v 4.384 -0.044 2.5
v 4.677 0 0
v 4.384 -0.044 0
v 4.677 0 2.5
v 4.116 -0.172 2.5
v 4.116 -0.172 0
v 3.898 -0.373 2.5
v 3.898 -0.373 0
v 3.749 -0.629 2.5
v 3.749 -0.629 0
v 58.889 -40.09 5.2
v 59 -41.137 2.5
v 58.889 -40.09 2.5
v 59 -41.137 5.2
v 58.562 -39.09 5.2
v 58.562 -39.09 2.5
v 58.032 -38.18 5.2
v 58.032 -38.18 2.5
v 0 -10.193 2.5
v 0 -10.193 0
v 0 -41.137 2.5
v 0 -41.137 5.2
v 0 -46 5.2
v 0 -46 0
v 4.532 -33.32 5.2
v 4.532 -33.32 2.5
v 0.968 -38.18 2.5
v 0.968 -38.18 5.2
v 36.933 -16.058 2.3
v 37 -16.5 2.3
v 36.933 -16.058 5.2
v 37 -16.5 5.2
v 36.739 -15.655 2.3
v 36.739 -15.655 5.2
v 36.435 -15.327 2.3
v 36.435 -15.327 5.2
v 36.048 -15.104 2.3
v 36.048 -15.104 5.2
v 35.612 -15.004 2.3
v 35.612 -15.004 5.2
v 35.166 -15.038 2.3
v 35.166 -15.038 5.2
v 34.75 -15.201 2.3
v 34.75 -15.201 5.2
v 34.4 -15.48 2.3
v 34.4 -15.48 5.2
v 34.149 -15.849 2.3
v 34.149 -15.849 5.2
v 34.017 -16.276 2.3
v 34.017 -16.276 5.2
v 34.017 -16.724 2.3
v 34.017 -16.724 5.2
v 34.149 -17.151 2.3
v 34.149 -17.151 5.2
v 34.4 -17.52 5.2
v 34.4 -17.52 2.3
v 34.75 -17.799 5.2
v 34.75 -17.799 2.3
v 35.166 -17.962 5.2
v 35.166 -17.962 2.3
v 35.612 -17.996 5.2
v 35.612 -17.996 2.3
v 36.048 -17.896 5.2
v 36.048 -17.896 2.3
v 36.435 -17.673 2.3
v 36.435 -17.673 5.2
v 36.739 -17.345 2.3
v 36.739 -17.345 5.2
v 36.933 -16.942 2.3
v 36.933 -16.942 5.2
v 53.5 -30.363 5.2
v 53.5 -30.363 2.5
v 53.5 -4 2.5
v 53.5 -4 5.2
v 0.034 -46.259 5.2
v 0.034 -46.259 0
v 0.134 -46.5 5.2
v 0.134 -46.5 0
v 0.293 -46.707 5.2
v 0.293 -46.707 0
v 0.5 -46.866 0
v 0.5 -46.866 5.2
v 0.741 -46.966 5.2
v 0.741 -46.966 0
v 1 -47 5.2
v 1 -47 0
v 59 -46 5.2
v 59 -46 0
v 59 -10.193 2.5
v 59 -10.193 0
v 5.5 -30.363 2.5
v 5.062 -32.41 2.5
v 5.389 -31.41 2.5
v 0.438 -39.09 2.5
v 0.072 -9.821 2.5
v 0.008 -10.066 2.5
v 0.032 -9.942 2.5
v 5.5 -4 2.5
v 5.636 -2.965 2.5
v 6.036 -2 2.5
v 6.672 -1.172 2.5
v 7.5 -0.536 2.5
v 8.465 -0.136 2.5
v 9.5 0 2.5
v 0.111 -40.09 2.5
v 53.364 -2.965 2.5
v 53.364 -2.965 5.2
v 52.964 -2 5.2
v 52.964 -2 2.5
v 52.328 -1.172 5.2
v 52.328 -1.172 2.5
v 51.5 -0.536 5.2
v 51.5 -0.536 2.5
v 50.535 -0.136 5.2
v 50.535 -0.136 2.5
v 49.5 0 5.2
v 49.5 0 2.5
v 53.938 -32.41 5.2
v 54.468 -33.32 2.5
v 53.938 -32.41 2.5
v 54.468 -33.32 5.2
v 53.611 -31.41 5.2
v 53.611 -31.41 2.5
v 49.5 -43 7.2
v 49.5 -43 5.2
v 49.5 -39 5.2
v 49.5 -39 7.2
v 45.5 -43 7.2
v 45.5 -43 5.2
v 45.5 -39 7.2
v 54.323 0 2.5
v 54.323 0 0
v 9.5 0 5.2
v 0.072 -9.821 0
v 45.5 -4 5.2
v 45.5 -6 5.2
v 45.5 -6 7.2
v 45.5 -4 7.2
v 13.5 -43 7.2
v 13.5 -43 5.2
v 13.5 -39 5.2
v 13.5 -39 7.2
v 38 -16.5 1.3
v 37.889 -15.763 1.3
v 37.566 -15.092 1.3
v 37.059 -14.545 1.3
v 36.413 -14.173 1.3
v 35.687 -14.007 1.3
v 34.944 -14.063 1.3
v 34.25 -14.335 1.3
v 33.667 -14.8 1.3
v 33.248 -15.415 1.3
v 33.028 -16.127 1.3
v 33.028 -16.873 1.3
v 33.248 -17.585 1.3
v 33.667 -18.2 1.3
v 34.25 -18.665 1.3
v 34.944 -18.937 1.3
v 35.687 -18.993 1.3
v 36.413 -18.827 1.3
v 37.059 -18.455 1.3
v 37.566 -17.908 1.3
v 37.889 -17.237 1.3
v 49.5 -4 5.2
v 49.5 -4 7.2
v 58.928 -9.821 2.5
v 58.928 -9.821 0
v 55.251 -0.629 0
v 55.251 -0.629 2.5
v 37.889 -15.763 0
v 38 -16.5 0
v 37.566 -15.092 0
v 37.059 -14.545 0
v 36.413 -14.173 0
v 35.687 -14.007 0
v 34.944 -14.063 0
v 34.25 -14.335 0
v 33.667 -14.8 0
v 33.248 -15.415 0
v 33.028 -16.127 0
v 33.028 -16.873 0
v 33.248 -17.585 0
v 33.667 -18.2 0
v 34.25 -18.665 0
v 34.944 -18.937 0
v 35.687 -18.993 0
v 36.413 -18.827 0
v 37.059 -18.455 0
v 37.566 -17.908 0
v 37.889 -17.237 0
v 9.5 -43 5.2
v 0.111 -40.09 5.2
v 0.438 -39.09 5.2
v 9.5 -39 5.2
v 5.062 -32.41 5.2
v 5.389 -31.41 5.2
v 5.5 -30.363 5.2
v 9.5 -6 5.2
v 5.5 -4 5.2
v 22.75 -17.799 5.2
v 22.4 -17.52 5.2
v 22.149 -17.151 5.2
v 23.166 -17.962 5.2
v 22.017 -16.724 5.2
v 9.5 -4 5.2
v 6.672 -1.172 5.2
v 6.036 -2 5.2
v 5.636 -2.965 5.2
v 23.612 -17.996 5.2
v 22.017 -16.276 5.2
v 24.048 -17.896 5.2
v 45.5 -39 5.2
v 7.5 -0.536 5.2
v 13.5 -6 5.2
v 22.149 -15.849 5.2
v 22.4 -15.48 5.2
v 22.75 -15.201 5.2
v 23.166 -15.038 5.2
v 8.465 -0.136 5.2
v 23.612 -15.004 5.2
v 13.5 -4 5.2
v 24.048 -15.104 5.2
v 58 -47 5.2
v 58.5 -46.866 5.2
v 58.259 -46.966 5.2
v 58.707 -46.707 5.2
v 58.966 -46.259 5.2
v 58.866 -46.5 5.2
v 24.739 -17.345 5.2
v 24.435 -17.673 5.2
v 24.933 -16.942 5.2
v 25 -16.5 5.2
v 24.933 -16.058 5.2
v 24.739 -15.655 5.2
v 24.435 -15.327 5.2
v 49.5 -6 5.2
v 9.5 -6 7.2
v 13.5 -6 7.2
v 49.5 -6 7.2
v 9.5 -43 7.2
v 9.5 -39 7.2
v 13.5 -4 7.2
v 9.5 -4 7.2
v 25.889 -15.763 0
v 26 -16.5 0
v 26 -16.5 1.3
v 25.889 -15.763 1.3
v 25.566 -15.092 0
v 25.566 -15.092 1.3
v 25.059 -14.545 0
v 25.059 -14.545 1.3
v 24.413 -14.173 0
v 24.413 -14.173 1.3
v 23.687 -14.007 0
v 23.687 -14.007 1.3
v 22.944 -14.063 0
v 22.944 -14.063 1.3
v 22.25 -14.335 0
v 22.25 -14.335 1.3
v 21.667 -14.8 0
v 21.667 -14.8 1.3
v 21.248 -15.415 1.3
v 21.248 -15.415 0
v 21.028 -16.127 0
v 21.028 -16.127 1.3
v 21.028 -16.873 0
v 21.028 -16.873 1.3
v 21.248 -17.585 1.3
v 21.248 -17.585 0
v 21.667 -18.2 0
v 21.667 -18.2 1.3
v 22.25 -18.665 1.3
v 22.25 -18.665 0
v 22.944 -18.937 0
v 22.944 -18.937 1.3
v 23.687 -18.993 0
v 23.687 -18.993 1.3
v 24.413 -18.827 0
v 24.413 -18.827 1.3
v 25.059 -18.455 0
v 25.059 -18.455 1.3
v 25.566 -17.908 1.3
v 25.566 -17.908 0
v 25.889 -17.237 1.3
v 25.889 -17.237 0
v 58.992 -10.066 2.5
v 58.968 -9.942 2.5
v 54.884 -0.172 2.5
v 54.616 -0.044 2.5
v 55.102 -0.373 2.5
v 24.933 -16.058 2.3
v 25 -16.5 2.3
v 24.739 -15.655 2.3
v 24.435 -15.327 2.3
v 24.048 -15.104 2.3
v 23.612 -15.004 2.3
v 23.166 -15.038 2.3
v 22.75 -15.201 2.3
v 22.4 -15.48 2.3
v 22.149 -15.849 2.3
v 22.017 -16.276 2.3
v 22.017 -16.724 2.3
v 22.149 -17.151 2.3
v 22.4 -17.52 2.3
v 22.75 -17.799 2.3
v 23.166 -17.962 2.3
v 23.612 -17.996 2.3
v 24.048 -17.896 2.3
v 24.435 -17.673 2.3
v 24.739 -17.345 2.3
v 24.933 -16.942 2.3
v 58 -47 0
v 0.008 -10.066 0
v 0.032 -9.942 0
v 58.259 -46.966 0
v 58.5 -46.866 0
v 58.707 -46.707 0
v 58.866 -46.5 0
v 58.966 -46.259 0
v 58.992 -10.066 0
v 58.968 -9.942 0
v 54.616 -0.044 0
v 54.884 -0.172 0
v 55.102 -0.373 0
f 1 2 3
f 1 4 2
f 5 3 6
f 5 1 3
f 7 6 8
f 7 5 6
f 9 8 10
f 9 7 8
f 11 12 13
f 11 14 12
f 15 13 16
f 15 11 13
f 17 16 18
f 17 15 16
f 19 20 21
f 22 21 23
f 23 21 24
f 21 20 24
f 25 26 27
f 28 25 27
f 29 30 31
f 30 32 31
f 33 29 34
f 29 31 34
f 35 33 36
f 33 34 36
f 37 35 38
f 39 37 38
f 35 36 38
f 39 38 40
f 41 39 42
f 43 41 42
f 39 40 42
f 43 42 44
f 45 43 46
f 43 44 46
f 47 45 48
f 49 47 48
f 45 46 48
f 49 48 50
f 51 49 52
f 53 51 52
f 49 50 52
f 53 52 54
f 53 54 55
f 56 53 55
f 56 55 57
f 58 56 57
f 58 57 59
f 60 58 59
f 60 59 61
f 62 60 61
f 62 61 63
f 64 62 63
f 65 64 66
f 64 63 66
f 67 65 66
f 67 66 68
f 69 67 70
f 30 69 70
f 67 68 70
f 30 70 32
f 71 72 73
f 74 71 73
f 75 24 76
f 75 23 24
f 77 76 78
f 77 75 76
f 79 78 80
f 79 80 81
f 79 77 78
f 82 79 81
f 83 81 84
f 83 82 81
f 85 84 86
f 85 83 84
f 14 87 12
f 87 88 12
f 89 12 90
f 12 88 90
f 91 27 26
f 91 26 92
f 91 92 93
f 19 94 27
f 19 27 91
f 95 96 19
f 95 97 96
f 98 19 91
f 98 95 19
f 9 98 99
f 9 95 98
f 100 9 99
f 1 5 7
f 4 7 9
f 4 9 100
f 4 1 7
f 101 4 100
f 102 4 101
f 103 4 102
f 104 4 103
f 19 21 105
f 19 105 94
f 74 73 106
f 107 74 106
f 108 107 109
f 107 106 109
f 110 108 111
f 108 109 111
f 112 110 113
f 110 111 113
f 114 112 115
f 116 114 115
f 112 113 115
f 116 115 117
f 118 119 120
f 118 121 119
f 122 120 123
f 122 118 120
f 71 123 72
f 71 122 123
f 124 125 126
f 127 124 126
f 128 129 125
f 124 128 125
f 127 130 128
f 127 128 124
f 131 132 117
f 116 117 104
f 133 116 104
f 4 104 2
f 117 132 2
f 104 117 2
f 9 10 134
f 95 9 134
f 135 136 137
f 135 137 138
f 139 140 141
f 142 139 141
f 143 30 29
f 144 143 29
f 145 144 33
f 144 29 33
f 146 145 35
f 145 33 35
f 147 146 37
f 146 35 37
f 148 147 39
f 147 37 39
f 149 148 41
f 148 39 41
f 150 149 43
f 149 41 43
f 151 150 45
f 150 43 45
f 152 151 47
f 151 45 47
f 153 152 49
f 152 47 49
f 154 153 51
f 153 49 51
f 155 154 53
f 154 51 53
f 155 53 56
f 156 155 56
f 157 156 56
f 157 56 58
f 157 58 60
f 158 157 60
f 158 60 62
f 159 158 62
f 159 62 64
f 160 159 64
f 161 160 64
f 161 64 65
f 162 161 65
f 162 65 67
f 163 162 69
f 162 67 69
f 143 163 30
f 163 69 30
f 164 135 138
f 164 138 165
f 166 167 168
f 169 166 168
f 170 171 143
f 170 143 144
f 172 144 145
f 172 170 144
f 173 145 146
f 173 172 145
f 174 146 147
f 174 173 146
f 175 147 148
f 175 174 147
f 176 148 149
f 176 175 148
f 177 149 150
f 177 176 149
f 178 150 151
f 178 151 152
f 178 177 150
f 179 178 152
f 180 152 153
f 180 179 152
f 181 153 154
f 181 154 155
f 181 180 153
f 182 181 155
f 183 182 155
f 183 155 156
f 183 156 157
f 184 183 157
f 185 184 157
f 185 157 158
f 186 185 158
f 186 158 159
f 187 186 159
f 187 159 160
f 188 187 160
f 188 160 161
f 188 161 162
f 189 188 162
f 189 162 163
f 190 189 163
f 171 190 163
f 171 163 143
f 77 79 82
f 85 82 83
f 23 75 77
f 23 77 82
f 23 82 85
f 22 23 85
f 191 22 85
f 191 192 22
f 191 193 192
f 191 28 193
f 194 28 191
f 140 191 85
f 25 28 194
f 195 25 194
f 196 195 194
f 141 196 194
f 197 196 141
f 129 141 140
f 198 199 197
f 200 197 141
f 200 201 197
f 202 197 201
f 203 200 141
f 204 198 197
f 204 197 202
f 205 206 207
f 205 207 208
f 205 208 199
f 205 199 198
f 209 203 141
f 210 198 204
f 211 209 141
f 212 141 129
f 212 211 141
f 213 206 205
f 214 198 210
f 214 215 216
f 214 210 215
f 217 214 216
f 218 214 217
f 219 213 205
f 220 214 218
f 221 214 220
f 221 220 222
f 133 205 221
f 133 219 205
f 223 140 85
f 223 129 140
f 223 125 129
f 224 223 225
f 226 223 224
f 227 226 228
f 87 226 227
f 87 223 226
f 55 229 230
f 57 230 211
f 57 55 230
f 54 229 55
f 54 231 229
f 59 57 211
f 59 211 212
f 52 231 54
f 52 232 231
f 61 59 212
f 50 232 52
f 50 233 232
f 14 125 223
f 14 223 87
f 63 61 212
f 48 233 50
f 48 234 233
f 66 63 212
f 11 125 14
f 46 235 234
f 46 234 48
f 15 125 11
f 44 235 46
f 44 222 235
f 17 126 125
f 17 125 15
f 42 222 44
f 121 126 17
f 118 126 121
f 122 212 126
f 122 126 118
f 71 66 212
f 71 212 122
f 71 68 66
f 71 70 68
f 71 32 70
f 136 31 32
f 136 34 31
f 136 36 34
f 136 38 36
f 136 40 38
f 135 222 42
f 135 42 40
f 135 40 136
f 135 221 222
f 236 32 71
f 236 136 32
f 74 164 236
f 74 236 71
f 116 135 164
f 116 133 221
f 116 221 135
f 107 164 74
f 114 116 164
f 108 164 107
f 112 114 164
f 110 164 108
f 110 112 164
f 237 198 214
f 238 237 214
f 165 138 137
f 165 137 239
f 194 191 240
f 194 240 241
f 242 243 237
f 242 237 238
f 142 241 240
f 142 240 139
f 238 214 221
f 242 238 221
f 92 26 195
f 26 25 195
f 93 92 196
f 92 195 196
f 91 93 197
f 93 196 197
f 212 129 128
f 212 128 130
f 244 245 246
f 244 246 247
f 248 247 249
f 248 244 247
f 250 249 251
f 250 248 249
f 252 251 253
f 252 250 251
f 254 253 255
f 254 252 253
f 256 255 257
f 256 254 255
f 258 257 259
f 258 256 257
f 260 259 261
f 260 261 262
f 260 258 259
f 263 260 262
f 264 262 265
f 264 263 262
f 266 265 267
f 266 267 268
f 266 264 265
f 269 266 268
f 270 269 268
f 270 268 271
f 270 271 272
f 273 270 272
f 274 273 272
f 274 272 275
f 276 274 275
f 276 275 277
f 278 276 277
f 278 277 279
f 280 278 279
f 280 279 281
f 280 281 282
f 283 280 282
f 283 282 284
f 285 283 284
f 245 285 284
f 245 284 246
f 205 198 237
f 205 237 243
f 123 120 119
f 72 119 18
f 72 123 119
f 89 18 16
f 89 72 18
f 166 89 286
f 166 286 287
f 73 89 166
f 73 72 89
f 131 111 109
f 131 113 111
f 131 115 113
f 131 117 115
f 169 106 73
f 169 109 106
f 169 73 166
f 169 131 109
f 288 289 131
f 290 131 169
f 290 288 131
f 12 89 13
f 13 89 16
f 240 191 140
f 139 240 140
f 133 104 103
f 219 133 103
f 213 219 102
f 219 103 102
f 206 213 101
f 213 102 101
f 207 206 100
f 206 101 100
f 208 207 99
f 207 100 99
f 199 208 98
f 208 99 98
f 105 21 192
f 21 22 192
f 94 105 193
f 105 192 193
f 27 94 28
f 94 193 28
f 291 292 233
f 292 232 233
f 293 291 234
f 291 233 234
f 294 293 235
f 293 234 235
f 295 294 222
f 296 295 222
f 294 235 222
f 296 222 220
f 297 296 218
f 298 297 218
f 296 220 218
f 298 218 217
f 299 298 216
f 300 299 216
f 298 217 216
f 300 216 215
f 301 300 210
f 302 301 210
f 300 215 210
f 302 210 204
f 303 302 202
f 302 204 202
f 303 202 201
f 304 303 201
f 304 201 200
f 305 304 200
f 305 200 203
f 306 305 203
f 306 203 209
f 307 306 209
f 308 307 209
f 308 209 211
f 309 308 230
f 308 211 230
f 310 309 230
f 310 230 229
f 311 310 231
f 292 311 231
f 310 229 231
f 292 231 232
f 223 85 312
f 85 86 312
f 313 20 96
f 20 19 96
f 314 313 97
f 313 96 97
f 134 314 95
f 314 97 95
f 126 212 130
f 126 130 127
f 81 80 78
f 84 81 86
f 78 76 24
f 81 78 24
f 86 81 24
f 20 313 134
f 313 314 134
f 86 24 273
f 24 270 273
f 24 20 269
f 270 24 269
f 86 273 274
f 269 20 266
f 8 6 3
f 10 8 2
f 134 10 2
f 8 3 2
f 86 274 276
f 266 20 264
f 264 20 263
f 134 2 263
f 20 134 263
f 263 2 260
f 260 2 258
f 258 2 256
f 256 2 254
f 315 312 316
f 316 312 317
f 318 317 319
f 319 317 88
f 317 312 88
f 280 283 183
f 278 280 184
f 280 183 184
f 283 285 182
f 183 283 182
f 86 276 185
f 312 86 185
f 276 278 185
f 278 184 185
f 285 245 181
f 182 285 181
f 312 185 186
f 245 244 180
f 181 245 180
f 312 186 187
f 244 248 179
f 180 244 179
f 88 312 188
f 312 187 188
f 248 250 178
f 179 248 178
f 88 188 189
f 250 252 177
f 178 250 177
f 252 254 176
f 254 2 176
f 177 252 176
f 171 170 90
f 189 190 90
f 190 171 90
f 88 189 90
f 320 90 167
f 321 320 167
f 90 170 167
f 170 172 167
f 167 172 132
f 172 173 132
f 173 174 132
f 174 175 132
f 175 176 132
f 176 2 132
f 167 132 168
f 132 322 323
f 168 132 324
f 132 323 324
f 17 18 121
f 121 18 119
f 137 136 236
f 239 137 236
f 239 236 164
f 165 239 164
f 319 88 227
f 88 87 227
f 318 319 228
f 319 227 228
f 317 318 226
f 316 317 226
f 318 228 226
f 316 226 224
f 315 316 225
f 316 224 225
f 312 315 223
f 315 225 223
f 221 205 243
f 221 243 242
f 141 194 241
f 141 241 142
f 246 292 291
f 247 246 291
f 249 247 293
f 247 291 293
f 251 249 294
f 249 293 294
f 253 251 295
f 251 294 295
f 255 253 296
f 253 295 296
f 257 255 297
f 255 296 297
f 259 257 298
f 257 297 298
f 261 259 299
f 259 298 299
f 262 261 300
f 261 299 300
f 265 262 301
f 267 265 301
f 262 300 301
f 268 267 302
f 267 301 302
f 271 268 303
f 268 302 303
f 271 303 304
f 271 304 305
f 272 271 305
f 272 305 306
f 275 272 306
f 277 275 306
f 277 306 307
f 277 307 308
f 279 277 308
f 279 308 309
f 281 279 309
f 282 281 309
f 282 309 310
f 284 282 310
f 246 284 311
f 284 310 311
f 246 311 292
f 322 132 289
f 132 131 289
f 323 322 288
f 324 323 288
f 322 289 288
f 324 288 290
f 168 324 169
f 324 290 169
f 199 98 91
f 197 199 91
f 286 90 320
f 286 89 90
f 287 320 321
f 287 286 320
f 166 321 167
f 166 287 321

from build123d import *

# Parameters (mm, degrees)
F1_DEPTH      = 2.5
F3_DEPTH      = 2.7
F4_R          = 1
F5_R          = 5
F6_W          = 4
F6_H          = 2
F6_H_2        = 4
F7_DEPTH      = 2
F8_R          = 1.5
F9_DEPTH      = 6
F10_R         = 2.5
F11_DEPTH     = 2.5
F12_S5_R      = 1.5
F12_T6_DEPTH  = 5
F12_S11_R     = 1.5
F12_T12_DEPTH = 5


# Not quite as in the source:
# - a fillet or chamfer that OpenCascade refuses, or shapes differently, is made with other operations: its cross-section is extruded or revolved along the edge and cut away or added


with BuildPart() as f1:
    # F0 (on Top) → F1 (new body)
    with BuildSketch(Plane.XY):
        Polygon((55, 0), (4, 0), (0, -10), (0, -47), (59, -47), (59, -10), align=None)
    extrude(amount=F1_DEPTH)

    # F2 (on face) → F3 (join)
    with BuildSketch(Plane.XY.offset(2.5)):
        with BuildLine():
            Line((0, -39.5), (0, -47))
            Line((0, -47), (59, -47))
            Line((59, -47), (59, -39.5))
            Line((59, -39.5), (53.5, -32))
            Line((53.5, -32), (53.5, -4))
            ThreePointArc((53.5, -4), (52.3284271247, -1.1715728753), (49.5, 0))
            Line((49.5, 0), (9.5, 0))
            ThreePointArc((9.5, 0), (6.6715728753, -1.1715728753), (5.5, -4))
            Line((5.5, -4), (5.5, -32))
            Line((5.5, -32), (0, -39.5))
        make_face()
    extrude(amount=F3_DEPTH)

    # F4
    f4_edges = [f1.edges().sort_by_distance(p)[0] for p in [
        (0, -47, 2.6),
        (59, -47, 2.6),
        (4, 0, 1.25),
        (55, 0, 1.25),
        (59, -10, 1.25),
        (0, -10, 1.25),
    ]]
    fillet(f4_edges, radius=F4_R)

    # F5
    f5_edges = [f1.edges().sort_by_distance(p)[0] for p in [
        (0, -39.5, 3.85),
        (59, -39.5, 3.85),
        (53.5, -32, 3.85),
        (5.5, -32, 3.85),
    ]]
    fillet(f5_edges, radius=F5_R)

    # F6 (on face) → F7 (join)
    with BuildSketch(Plane.XY.offset(5.2)):
        with Locations((11.5, -5)):
            Rectangle(F6_W, F6_H)
        with Locations((11.5, -41)):
            Rectangle(F6_W, F6_H_2)
        with Locations((47.5, -5)):
            Rectangle(F6_W, F6_H)
        with Locations((47.5, -41)):
            Rectangle(F6_W, F6_H_2)
    extrude(amount=F7_DEPTH)

    # F8 (on face) → F9 (cut)
    with BuildSketch(Plane.XY.offset(5.2)):
        with Locations((23.5, -16.5)):
            Circle(F8_R)
        with Locations((35.5, -16.5)):
            Circle(F8_R)
    extrude(amount=-F9_DEPTH, mode=Mode.SUBTRACT)

    # F10 (on face) → F11 (cut)
    with BuildSketch(Plane.XY):
        with Locations((35.5, -16.5)):
            Circle(F10_R)
        with Locations((23.5, -16.5)):
            Circle(F10_R)
    extrude(amount=F11_DEPTH, mode=Mode.SUBTRACT)

    # F12: chamfer of 1.2 on 2 edges, made by hand


with BuildPart() as f12_tool2:
    # F12_s3 → F12_t4 (revolve)
    with BuildSketch(Plane.XZ.offset(16.5)):
        Polygon((38, 1.3), (36.8, 2.5), (38, 2.5), align=None)
    revolve(axis=Axis((35.5, -16.5, 2.5), (0, 0, 1)))

    # F12_s5 → F12_t6 (cut, symmetric)
    with BuildSketch(Plane.XY.offset(1.9)):
        with Locations((35.5, -16.5)):
            Circle(F12_S5_R)
    extrude(amount=F12_T6_DEPTH, both=True, mode=Mode.SUBTRACT)


with BuildPart() as f1_1:
    add(f1.part)

    # F12_t1: union F12_tool2
    add(f12_tool2.part)


with BuildPart() as f12_tool8:
    # F12_s9 → F12_t10 (revolve)
    with BuildSketch(Plane.XZ.offset(16.5)):
        Polygon((26, 1.3), (24.8, 2.5), (26, 2.5), align=None)
    revolve(axis=Axis((23.5, -16.5, 2.5), (0, 0, 1)))

    # F12_s11 → F12_t12 (cut, symmetric)
    with BuildSketch(Plane.XY.offset(1.9)):
        with Locations((23.5, -16.5)):
            Circle(F12_S11_R)
    extrude(amount=F12_T12_DEPTH, both=True, mode=Mode.SUBTRACT)


with BuildPart() as f1_2:
    add(f1_1.part)

    # F12_t7: union F12_tool8
    add(f12_tool8.part)


solid = f1_2.part
